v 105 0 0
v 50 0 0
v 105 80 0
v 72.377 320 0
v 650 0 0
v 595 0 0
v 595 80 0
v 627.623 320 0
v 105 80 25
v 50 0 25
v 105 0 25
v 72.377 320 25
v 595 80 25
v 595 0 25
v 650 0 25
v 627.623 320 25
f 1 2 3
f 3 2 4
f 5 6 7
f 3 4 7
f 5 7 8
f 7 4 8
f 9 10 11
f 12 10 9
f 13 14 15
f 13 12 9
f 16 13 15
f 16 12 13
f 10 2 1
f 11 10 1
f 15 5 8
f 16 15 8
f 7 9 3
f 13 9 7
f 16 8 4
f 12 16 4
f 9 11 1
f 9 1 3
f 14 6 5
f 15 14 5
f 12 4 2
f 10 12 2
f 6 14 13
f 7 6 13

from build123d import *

# Parameters (mm, degrees)
BOSS_EXTRUDE1_DEPTH = 25
SKETCH3_W           = 80
SKETCH3_H           = 80
CUT_EXTRUDE2_DEPTH  = 26


with BuildPart() as part:
    # Sketch1 → Boss-Extrude1 (new body)
    with BuildSketch(Plane.XY):
        Polygon((50, 0), (185, 0), (185, 80), (515, 80), (515, 0), (650, 0), (627.623420178, 320), (72.376579822, 320), align=None)
    extrude(amount=BOSS_EXTRUDE1_DEPTH)

    # Sketch3 → Cut-Extrude2 (cut, through all)
    with BuildSketch(Plane.XY.offset(25)):
        with Locations((145, 40)):
            Rectangle(SKETCH3_W, SKETCH3_H)
        with Locations((555, 40)):
            Rectangle(SKETCH3_W, SKETCH3_H)
    extrude(amount=-CUT_EXTRUDE2_DEPTH, mode=Mode.SUBTRACT)


solid = part.part
